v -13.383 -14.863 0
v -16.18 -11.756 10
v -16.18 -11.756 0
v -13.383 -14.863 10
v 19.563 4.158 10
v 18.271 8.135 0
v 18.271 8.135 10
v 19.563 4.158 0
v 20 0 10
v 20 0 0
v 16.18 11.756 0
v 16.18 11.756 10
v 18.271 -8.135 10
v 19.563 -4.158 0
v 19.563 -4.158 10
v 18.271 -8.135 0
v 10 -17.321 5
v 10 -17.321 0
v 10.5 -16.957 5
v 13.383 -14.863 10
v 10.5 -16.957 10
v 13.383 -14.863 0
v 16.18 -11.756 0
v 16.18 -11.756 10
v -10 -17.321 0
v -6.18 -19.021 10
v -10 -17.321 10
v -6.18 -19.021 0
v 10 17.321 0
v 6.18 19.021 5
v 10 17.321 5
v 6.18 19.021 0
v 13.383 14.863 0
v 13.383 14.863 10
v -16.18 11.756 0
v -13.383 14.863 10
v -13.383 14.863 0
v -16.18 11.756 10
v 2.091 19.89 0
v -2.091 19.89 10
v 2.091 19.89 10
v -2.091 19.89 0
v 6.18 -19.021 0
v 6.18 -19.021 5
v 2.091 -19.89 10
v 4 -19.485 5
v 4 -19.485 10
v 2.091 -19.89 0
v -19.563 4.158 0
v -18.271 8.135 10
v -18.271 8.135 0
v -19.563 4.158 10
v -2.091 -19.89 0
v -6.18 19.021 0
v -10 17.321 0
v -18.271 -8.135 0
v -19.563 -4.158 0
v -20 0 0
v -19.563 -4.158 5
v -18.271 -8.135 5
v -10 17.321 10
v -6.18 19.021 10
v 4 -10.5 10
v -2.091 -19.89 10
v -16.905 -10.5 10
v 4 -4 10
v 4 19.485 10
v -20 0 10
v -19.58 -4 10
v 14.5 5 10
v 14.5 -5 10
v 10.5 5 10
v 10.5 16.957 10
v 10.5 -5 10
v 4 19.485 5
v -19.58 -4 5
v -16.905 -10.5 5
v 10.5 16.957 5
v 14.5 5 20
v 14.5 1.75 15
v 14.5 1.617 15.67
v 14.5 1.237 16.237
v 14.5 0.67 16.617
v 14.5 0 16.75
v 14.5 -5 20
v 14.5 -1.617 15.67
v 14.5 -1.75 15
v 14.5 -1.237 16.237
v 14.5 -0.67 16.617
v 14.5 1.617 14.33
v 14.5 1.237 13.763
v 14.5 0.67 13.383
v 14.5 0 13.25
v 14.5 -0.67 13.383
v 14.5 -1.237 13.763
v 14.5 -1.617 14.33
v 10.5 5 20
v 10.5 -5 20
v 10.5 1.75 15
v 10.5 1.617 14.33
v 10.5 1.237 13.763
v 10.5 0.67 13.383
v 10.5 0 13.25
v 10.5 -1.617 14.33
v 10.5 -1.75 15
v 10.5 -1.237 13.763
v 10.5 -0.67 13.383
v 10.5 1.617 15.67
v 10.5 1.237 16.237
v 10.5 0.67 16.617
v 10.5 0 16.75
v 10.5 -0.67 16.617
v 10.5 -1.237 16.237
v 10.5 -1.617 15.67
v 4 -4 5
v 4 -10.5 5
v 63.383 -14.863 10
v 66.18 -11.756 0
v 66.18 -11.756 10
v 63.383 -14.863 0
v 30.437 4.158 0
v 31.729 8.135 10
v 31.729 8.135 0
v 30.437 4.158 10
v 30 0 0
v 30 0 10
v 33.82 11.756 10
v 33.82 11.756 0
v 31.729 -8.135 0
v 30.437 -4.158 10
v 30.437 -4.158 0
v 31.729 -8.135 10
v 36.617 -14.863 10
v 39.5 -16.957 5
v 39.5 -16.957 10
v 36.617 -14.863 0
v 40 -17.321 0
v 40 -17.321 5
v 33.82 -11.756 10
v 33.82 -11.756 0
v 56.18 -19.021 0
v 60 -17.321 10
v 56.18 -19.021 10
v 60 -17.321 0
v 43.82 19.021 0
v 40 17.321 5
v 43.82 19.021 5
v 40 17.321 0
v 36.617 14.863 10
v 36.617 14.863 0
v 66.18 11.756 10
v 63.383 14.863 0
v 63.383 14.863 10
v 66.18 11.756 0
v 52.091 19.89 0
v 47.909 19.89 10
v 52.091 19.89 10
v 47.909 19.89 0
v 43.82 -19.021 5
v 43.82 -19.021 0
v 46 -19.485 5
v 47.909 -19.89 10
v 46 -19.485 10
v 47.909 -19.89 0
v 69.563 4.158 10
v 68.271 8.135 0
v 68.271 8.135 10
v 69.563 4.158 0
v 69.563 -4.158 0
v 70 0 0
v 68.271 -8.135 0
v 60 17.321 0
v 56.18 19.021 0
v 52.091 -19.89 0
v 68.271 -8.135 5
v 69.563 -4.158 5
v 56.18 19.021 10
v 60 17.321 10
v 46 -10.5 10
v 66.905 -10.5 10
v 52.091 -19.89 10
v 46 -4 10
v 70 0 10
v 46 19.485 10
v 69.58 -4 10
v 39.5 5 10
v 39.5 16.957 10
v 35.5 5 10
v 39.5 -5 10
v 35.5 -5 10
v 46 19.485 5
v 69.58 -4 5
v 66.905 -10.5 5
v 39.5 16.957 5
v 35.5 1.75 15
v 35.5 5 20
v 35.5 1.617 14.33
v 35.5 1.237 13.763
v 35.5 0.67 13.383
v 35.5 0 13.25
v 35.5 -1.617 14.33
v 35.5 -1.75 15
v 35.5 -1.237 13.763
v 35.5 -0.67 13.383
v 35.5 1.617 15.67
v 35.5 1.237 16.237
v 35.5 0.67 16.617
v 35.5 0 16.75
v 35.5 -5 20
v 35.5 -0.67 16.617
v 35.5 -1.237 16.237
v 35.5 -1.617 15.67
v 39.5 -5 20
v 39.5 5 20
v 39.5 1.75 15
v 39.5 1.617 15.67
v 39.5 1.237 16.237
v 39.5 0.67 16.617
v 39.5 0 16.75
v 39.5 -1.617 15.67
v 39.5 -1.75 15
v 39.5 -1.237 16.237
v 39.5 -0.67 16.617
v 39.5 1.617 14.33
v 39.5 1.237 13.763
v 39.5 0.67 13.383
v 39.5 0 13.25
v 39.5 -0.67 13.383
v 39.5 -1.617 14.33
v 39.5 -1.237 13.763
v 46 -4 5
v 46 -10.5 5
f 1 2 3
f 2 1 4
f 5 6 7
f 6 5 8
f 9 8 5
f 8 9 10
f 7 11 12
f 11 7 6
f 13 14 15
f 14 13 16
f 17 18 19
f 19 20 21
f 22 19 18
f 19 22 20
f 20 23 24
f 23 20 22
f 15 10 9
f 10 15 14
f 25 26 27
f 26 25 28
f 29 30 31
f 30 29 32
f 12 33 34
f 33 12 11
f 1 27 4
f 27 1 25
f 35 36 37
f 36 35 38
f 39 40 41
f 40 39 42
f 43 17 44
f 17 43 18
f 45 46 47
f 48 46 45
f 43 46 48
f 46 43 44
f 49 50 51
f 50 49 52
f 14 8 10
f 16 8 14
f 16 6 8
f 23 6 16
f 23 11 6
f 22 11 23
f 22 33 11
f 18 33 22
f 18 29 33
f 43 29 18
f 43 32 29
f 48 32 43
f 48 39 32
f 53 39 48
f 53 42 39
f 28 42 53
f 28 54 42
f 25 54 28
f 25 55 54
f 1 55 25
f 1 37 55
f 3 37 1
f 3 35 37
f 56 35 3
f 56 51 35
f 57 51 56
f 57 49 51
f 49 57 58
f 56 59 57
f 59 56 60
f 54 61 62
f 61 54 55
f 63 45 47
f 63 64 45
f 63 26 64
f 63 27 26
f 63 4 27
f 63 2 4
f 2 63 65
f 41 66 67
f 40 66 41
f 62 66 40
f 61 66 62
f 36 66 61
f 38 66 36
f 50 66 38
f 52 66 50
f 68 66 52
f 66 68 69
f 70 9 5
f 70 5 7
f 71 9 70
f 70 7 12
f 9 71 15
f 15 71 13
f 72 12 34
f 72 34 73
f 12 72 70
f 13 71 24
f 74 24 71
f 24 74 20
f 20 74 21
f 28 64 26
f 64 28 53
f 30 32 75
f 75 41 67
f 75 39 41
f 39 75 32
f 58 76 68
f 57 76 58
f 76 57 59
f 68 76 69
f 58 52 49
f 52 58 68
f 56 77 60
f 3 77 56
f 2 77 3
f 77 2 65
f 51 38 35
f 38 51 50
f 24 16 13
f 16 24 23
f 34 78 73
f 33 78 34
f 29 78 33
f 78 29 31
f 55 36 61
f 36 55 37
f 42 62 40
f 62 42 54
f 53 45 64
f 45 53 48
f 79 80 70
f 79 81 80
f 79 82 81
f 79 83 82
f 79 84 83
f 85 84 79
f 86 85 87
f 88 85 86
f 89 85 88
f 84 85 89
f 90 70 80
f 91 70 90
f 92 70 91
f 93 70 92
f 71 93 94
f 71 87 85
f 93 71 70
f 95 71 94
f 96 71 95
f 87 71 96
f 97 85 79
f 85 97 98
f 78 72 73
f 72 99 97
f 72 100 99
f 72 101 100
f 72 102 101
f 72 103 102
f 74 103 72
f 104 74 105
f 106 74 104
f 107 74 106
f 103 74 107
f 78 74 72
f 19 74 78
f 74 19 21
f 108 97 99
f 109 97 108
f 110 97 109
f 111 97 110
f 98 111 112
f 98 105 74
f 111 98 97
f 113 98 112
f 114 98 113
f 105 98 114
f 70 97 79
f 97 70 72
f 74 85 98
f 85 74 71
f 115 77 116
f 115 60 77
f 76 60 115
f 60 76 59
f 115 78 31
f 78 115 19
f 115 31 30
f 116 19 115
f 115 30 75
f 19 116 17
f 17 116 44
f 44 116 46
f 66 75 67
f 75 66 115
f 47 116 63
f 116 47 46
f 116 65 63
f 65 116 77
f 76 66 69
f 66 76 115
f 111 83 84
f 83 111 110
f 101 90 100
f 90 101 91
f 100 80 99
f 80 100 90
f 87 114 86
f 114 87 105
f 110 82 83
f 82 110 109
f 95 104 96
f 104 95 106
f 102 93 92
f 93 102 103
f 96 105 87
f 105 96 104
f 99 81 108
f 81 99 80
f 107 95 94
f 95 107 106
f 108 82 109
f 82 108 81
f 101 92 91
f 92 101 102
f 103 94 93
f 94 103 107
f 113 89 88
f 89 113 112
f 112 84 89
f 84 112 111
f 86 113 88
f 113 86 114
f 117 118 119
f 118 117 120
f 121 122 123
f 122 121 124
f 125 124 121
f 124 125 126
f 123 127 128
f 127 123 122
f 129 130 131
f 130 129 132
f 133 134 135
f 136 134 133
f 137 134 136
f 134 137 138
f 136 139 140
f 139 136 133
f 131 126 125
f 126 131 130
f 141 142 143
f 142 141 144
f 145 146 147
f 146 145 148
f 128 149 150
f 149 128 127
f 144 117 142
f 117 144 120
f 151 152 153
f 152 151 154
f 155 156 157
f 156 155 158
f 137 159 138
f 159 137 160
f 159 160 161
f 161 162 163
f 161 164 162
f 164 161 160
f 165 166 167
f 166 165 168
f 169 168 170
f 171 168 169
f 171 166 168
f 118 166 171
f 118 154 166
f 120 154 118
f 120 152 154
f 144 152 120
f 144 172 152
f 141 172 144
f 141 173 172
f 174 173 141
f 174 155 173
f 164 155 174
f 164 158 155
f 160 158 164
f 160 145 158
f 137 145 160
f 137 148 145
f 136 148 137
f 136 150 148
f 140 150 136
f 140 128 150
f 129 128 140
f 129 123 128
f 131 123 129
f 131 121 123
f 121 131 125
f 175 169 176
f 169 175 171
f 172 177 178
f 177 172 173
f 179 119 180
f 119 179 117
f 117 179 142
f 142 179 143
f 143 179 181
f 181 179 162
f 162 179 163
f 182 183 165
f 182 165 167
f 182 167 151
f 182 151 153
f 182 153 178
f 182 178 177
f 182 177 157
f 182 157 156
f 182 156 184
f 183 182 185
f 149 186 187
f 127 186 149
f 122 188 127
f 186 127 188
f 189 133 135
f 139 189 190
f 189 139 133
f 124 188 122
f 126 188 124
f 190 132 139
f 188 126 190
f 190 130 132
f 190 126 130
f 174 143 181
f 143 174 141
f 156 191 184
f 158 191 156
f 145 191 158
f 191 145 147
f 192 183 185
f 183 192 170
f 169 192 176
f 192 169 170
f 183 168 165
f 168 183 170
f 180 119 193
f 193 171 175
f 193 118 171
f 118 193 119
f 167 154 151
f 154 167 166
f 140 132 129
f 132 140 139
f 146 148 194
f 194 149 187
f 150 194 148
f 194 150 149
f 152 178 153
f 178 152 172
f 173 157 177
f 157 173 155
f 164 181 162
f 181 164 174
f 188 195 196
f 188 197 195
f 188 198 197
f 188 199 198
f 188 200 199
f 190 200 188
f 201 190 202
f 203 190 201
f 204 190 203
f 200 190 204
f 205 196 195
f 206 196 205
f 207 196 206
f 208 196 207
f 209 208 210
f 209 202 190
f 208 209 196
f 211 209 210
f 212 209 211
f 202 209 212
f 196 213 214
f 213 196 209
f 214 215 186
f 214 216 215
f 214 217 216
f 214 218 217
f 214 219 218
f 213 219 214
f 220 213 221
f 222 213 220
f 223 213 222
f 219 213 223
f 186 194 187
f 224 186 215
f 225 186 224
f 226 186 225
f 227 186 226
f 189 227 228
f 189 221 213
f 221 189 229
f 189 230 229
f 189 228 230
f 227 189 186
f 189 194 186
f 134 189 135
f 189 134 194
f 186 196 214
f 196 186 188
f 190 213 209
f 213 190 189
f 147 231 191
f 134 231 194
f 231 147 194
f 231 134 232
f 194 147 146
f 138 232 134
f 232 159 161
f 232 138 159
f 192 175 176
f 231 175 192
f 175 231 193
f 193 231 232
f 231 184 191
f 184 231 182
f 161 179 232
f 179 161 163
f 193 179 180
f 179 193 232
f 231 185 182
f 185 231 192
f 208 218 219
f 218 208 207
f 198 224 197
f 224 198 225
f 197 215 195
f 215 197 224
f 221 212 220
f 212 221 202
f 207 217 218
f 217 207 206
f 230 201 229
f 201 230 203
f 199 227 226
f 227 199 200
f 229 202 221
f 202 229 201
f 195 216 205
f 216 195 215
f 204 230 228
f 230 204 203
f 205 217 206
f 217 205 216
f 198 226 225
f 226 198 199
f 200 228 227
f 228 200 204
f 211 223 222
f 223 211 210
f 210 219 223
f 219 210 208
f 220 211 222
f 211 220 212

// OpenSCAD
// file: ../config.scad
r4 = 2.2;
r8 = 4.2;
r10 = 5.2;

layer_height = 0.25;

switch_d = 9.6;

nema17_r_vis = 15.5;
nema17_r_centre = 11.5;
nema17_h_centre = 2;
nema17_h = 43;
nema17_l = 40;

boite_ui_largeur = 28.5;
boite_ui_l = 46;

support_laser = 24;

r3 = 1.75;
r3_2d = 1.5;
r3_vis = 1.65;
r3_head = 3.6;
m3_r = r3;
m3_nut_d = 7;
m3_nut_d2 = 6.2;
m3_nut_h = 3;

m4_nut_d = 8;
m4_nut_d2 = 7;
m4_nut_h = 4;

608_r = 23/2;
608_h = 8;

laser_printer_l = 609;
laser_printer_lg = 456;

module support_nut(d=3, l_screw1 = 20, l_screw2 = 20, l_nut = 20, h_screw2 = -0.1){
    if(d==3){
        screw_r = r3;
        nut_r = m3_nut_d/2;
        nut_h = m3_nut_h;
        cylinder(nut_h, r = nut_r, $fn = 6, center = true);
        translate([0, 0, -l_screw1])cylinder(l_screw1 +1, r = screw_r);
        translate([0, 0, m3_nut_h/2+ h_screw2])cylinder(l_screw2, r = screw_r);
        l = m3_nut_d*cos(30);
        translate([0, -l/2, -nut_h/2]) cube([l_nut, l,nut_h]);
    } else if(d==4){
        screw_r = r4;
        nut_r = m4_nut_d/2;
        nut_h = m4_nut_h;
        cylinder(nut_h, r = nut_r, $fn = 6, center = true);
        translate([0, 0, -l_screw1])cylinder(l_screw1 +1, r = screw_r);
        translate([0, 0, m4_nut_h/2+ h_screw2])cylinder(l_screw2, r = screw_r);
        l = m4_nut_d*cos(30);
        translate([0, -l/2, -nut_h/2]) cube([l_nut, l,nut_h]);
    }
}


module nut(d=3, center = false){
    nut_r = m3_nut_d/2;
    nut_h = m3_nut_h;
    if(d==3){
        nut_r = m3_nut_d/2;
        nut_h = m3_nut_h;
    } 
    cylinder(nut_h, r = nut_r, $fn = 6, center = center);
}



module m3(h, nut = false, head = false){
    cylinder(h, m3_r, m3_r, $fn=16);
    if(nut){
        cylinder(m3_nut_h, r = m3_nut_d/2, $fn = 6);
    }
}

module m3_nut(h){
    cylinder(m3_nut_h, r = m3_nut_d/2, $fn = 6);
    translate([0, -m3_nut_d2/2, 0]) cube([h, m3_nut_d2, m3_nut_h]);
}

m4_r = 2.3;
m4_nut_d = 8.4;
m4_nut_d2 = 7.5;
m4_nut_h = 3.5;
module m4(h, nut = false, head = false){
    cylinder(h, m4_r, m4_r);
    if(nut){
        cylinder(m4_nut_h, r = m4_nut_d/2, $fn = 6);
    }
}

module m5(h, nut = false, head = false){
    cylinder(h, r = 2.7);
}

m8_nut_d = 15;
m8_nut_d2 = 13;
m8_nut_h = 6.5;
module m8(h, nut = false, head = false){
    cylinder(h, r = r8);
    if(nut){
        cylinder(m8_nut_h, r = m8_nut_d/2, $fn = 6);
    }
}

module cube_arrondi(x, y, z, r=2){
    hull(){
        translate([(x/2-r), (y/2-r), 0]) cylinder(z,r=r);
        translate([(x/2-r), -(y/2-r), 0]) cylinder(z,r=r);
        translate([-(x/2-r), (y/2-r), 0]) cylinder(z,r=r);
        translate([-(x/2-r), -(y/2-r), 0]) cylinder(z,r=r);
    }
}

module demi_glissiere(r, l, h){
    cylinder(h, r, r);
    translate([-r, 0, 0]) cube([r*2, l, h]);
}


module nema17_2d(){
    nema17_l = 43;
    nema17_h = 6;
    polygon([[0,nema17_h], [nema17_h,0]
            , [nema17_l-nema17_h,0],[nema17_l,nema17_h]
            , [nema17_l,nema17_l-nema17_h],[nema17_l-nema17_h,nema17_l]
            , [8,nema17_l],[0,nema17_l-nema17_h] ]);
}

module nema17_2d2(){
    translate([nema17_r_vis, nema17_r_vis] ) circle(r3_2d);
    translate([nema17_r_vis, -nema17_r_vis] ) circle(r3_2d);
    translate([-nema17_r_vis, nema17_r_vis] ) circle(r3_2d);
    translate([-nema17_r_vis, -nema17_r_vis] ) circle(r3_2d);
    circle(nema17_r_centre);
}


module nema17(){
    translate([-nema17_h/2, -nema17_h/2, -nema17_l/2] ) linear_extrude(nema17_l) nema17_2d();
    
    h = nema17_h/2+6;
    translate([nema17_r_vis, nema17_r_vis, 0] )rotate([0, 0, 0]) cylinder(h, r = r3);
    translate([nema17_r_vis, -nema17_r_vis, 0] )rotate([0, 0, 0]) cylinder(h, r = r3);
    translate([-nema17_r_vis, nema17_r_vis, 0] )rotate([0, 0, 0]) cylinder(h, r = r3);
    translate([-nema17_r_vis, -nema17_r_vis, 0] )rotate([0, 0, 0]) cylinder(h, r = r3);
    cylinder(h, nema17_r_centre, nema17_r_centre);
    cylinder(h+14, r = 8);
    
    translate([-8.5, 0, -nema17_l/2] ) cube([17,30, 10]);
}

module corner(l_corner, h_corner, lg_corner){
    translate([0, lg_corner, 0]) rotate([90, 0, 0]) linear_extrude(lg_corner) polygon([[0,0], [l_corner, 0], [0, h_corner]]);
}


/**
 * 2D
 **/

module m3_2d(){
    circle(r3_2d);
}


module cran_x(_l, e, cran, inv){
    difference(){
        square([_l, e]);
        if(inv){
            for(i=[-round(_l/cran):round(_l/cran)]){
                translate([_l/2 + cran/2 - 2*i*cran, -1]) square([cran, e+2]);
            }
        }else{
            for(i=[-round(_l/cran):round(_l/cran)]){
                translate([_l/2 - cran/2 - 2*i*cran, -1]) square([cran, e+2]);
            }
        }
    }
}

module cran_y(_l, e, cran, inv){
    translate([e, 0]) rotate([0, 0, 90]) cran_x(_l, e, cran, inv); 
}

module whole_2d(type_vis){
    if(type_vis == 3){
        circle(1.5);
    } else if(type_vis == 4){
        circle(2);
    } else {
        echo("whole_2d " + type_vis);
    }
}

module nuts_2d(type_vis){
    if(type_vis == 3){
        translate([-1.5, 0])square([3, 20]);
        translate([-5.5/2, 10])square([5.5, 2.5]);
    } else if(type_vis == 4){
        translate([-2, 0])square([4, 30]);
        translate([-7/2, 20])square([7, 3.5]);
    } else {
        echo("nuts_2d " + type_vis);
    }
}

module cran_x_vis(_l, e, cran, type_vis = 3, trous = [0.1, 0.5, 0.9]){
    difference(){
        square([_l, e]);
        for(i=[-round(_l/cran):round(_l/cran)]){
                translate([_l/2 - cran/2 - 2*i*cran, -1]) square([cran, e+2]);
            }
        
    }
    for(i = trous){
        j = round((i-0.5)*_l/(2*cran));
        translate([_l/2  - 2*j*cran, e/2]) whole_2d(type_vis);
    }
}

module cran_x_nuts(_l, e, cran, type_vis = 3, trous = [0.1, 0.5, 0.9]){
    difference(){
        square([_l, e]);
        for(i=[-round(_l/cran):round(_l/cran)]){
                translate([_l/2 + cran/2 - 2*i*cran, -1]) square([cran, e+2]);
        }
    }
    for(i = trous){
        j = round((i-0.5)*_l/(2*cran));
        translate([_l/2  - 2*j*cran, e/2]) nuts_2d(type_vis);
    }
}

module cran_y_vis(_l, e, cran, type_vis = 3, trous = [0.1, 0.5, 0.9]){
    translate([e, 0]) rotate([0, 0, 90]) cran_x_vis(_l, e, cran, type_vis, trous);
}

module cran_y_nuts(_l, e, cran, type_vis = 3, trous = [0.1, 0.5, 0.9]){
    translate([0, _l]) rotate([0, 0, -90]) cran_x_nuts(_l, e, cran, type_vis, trous);
}


module fixation_2d(){
    translate([-5,0])square([2,4], center=true);
    translate([5,0])square([2,4], center=true);
}
// main file
include <../config.scad>

e = 6.5;

module pied(){
    difference(){
        union(){
            cylinder(r=20, 5+5);
            translate([4+e, -5, 5])cube([4, 10, 15]);
        }
        translate([4, -25, 5])cube([e, 50, 50]);
        rotate([0,0,-90]) translate([4, -41, 5])cube([e, 50, 50]);
        translate([-15, 0, 15]) rotate([0,90,0]) m3(100);
    }
}

translate([50,0,0])mirror([1,0,0])pied();
pied();
